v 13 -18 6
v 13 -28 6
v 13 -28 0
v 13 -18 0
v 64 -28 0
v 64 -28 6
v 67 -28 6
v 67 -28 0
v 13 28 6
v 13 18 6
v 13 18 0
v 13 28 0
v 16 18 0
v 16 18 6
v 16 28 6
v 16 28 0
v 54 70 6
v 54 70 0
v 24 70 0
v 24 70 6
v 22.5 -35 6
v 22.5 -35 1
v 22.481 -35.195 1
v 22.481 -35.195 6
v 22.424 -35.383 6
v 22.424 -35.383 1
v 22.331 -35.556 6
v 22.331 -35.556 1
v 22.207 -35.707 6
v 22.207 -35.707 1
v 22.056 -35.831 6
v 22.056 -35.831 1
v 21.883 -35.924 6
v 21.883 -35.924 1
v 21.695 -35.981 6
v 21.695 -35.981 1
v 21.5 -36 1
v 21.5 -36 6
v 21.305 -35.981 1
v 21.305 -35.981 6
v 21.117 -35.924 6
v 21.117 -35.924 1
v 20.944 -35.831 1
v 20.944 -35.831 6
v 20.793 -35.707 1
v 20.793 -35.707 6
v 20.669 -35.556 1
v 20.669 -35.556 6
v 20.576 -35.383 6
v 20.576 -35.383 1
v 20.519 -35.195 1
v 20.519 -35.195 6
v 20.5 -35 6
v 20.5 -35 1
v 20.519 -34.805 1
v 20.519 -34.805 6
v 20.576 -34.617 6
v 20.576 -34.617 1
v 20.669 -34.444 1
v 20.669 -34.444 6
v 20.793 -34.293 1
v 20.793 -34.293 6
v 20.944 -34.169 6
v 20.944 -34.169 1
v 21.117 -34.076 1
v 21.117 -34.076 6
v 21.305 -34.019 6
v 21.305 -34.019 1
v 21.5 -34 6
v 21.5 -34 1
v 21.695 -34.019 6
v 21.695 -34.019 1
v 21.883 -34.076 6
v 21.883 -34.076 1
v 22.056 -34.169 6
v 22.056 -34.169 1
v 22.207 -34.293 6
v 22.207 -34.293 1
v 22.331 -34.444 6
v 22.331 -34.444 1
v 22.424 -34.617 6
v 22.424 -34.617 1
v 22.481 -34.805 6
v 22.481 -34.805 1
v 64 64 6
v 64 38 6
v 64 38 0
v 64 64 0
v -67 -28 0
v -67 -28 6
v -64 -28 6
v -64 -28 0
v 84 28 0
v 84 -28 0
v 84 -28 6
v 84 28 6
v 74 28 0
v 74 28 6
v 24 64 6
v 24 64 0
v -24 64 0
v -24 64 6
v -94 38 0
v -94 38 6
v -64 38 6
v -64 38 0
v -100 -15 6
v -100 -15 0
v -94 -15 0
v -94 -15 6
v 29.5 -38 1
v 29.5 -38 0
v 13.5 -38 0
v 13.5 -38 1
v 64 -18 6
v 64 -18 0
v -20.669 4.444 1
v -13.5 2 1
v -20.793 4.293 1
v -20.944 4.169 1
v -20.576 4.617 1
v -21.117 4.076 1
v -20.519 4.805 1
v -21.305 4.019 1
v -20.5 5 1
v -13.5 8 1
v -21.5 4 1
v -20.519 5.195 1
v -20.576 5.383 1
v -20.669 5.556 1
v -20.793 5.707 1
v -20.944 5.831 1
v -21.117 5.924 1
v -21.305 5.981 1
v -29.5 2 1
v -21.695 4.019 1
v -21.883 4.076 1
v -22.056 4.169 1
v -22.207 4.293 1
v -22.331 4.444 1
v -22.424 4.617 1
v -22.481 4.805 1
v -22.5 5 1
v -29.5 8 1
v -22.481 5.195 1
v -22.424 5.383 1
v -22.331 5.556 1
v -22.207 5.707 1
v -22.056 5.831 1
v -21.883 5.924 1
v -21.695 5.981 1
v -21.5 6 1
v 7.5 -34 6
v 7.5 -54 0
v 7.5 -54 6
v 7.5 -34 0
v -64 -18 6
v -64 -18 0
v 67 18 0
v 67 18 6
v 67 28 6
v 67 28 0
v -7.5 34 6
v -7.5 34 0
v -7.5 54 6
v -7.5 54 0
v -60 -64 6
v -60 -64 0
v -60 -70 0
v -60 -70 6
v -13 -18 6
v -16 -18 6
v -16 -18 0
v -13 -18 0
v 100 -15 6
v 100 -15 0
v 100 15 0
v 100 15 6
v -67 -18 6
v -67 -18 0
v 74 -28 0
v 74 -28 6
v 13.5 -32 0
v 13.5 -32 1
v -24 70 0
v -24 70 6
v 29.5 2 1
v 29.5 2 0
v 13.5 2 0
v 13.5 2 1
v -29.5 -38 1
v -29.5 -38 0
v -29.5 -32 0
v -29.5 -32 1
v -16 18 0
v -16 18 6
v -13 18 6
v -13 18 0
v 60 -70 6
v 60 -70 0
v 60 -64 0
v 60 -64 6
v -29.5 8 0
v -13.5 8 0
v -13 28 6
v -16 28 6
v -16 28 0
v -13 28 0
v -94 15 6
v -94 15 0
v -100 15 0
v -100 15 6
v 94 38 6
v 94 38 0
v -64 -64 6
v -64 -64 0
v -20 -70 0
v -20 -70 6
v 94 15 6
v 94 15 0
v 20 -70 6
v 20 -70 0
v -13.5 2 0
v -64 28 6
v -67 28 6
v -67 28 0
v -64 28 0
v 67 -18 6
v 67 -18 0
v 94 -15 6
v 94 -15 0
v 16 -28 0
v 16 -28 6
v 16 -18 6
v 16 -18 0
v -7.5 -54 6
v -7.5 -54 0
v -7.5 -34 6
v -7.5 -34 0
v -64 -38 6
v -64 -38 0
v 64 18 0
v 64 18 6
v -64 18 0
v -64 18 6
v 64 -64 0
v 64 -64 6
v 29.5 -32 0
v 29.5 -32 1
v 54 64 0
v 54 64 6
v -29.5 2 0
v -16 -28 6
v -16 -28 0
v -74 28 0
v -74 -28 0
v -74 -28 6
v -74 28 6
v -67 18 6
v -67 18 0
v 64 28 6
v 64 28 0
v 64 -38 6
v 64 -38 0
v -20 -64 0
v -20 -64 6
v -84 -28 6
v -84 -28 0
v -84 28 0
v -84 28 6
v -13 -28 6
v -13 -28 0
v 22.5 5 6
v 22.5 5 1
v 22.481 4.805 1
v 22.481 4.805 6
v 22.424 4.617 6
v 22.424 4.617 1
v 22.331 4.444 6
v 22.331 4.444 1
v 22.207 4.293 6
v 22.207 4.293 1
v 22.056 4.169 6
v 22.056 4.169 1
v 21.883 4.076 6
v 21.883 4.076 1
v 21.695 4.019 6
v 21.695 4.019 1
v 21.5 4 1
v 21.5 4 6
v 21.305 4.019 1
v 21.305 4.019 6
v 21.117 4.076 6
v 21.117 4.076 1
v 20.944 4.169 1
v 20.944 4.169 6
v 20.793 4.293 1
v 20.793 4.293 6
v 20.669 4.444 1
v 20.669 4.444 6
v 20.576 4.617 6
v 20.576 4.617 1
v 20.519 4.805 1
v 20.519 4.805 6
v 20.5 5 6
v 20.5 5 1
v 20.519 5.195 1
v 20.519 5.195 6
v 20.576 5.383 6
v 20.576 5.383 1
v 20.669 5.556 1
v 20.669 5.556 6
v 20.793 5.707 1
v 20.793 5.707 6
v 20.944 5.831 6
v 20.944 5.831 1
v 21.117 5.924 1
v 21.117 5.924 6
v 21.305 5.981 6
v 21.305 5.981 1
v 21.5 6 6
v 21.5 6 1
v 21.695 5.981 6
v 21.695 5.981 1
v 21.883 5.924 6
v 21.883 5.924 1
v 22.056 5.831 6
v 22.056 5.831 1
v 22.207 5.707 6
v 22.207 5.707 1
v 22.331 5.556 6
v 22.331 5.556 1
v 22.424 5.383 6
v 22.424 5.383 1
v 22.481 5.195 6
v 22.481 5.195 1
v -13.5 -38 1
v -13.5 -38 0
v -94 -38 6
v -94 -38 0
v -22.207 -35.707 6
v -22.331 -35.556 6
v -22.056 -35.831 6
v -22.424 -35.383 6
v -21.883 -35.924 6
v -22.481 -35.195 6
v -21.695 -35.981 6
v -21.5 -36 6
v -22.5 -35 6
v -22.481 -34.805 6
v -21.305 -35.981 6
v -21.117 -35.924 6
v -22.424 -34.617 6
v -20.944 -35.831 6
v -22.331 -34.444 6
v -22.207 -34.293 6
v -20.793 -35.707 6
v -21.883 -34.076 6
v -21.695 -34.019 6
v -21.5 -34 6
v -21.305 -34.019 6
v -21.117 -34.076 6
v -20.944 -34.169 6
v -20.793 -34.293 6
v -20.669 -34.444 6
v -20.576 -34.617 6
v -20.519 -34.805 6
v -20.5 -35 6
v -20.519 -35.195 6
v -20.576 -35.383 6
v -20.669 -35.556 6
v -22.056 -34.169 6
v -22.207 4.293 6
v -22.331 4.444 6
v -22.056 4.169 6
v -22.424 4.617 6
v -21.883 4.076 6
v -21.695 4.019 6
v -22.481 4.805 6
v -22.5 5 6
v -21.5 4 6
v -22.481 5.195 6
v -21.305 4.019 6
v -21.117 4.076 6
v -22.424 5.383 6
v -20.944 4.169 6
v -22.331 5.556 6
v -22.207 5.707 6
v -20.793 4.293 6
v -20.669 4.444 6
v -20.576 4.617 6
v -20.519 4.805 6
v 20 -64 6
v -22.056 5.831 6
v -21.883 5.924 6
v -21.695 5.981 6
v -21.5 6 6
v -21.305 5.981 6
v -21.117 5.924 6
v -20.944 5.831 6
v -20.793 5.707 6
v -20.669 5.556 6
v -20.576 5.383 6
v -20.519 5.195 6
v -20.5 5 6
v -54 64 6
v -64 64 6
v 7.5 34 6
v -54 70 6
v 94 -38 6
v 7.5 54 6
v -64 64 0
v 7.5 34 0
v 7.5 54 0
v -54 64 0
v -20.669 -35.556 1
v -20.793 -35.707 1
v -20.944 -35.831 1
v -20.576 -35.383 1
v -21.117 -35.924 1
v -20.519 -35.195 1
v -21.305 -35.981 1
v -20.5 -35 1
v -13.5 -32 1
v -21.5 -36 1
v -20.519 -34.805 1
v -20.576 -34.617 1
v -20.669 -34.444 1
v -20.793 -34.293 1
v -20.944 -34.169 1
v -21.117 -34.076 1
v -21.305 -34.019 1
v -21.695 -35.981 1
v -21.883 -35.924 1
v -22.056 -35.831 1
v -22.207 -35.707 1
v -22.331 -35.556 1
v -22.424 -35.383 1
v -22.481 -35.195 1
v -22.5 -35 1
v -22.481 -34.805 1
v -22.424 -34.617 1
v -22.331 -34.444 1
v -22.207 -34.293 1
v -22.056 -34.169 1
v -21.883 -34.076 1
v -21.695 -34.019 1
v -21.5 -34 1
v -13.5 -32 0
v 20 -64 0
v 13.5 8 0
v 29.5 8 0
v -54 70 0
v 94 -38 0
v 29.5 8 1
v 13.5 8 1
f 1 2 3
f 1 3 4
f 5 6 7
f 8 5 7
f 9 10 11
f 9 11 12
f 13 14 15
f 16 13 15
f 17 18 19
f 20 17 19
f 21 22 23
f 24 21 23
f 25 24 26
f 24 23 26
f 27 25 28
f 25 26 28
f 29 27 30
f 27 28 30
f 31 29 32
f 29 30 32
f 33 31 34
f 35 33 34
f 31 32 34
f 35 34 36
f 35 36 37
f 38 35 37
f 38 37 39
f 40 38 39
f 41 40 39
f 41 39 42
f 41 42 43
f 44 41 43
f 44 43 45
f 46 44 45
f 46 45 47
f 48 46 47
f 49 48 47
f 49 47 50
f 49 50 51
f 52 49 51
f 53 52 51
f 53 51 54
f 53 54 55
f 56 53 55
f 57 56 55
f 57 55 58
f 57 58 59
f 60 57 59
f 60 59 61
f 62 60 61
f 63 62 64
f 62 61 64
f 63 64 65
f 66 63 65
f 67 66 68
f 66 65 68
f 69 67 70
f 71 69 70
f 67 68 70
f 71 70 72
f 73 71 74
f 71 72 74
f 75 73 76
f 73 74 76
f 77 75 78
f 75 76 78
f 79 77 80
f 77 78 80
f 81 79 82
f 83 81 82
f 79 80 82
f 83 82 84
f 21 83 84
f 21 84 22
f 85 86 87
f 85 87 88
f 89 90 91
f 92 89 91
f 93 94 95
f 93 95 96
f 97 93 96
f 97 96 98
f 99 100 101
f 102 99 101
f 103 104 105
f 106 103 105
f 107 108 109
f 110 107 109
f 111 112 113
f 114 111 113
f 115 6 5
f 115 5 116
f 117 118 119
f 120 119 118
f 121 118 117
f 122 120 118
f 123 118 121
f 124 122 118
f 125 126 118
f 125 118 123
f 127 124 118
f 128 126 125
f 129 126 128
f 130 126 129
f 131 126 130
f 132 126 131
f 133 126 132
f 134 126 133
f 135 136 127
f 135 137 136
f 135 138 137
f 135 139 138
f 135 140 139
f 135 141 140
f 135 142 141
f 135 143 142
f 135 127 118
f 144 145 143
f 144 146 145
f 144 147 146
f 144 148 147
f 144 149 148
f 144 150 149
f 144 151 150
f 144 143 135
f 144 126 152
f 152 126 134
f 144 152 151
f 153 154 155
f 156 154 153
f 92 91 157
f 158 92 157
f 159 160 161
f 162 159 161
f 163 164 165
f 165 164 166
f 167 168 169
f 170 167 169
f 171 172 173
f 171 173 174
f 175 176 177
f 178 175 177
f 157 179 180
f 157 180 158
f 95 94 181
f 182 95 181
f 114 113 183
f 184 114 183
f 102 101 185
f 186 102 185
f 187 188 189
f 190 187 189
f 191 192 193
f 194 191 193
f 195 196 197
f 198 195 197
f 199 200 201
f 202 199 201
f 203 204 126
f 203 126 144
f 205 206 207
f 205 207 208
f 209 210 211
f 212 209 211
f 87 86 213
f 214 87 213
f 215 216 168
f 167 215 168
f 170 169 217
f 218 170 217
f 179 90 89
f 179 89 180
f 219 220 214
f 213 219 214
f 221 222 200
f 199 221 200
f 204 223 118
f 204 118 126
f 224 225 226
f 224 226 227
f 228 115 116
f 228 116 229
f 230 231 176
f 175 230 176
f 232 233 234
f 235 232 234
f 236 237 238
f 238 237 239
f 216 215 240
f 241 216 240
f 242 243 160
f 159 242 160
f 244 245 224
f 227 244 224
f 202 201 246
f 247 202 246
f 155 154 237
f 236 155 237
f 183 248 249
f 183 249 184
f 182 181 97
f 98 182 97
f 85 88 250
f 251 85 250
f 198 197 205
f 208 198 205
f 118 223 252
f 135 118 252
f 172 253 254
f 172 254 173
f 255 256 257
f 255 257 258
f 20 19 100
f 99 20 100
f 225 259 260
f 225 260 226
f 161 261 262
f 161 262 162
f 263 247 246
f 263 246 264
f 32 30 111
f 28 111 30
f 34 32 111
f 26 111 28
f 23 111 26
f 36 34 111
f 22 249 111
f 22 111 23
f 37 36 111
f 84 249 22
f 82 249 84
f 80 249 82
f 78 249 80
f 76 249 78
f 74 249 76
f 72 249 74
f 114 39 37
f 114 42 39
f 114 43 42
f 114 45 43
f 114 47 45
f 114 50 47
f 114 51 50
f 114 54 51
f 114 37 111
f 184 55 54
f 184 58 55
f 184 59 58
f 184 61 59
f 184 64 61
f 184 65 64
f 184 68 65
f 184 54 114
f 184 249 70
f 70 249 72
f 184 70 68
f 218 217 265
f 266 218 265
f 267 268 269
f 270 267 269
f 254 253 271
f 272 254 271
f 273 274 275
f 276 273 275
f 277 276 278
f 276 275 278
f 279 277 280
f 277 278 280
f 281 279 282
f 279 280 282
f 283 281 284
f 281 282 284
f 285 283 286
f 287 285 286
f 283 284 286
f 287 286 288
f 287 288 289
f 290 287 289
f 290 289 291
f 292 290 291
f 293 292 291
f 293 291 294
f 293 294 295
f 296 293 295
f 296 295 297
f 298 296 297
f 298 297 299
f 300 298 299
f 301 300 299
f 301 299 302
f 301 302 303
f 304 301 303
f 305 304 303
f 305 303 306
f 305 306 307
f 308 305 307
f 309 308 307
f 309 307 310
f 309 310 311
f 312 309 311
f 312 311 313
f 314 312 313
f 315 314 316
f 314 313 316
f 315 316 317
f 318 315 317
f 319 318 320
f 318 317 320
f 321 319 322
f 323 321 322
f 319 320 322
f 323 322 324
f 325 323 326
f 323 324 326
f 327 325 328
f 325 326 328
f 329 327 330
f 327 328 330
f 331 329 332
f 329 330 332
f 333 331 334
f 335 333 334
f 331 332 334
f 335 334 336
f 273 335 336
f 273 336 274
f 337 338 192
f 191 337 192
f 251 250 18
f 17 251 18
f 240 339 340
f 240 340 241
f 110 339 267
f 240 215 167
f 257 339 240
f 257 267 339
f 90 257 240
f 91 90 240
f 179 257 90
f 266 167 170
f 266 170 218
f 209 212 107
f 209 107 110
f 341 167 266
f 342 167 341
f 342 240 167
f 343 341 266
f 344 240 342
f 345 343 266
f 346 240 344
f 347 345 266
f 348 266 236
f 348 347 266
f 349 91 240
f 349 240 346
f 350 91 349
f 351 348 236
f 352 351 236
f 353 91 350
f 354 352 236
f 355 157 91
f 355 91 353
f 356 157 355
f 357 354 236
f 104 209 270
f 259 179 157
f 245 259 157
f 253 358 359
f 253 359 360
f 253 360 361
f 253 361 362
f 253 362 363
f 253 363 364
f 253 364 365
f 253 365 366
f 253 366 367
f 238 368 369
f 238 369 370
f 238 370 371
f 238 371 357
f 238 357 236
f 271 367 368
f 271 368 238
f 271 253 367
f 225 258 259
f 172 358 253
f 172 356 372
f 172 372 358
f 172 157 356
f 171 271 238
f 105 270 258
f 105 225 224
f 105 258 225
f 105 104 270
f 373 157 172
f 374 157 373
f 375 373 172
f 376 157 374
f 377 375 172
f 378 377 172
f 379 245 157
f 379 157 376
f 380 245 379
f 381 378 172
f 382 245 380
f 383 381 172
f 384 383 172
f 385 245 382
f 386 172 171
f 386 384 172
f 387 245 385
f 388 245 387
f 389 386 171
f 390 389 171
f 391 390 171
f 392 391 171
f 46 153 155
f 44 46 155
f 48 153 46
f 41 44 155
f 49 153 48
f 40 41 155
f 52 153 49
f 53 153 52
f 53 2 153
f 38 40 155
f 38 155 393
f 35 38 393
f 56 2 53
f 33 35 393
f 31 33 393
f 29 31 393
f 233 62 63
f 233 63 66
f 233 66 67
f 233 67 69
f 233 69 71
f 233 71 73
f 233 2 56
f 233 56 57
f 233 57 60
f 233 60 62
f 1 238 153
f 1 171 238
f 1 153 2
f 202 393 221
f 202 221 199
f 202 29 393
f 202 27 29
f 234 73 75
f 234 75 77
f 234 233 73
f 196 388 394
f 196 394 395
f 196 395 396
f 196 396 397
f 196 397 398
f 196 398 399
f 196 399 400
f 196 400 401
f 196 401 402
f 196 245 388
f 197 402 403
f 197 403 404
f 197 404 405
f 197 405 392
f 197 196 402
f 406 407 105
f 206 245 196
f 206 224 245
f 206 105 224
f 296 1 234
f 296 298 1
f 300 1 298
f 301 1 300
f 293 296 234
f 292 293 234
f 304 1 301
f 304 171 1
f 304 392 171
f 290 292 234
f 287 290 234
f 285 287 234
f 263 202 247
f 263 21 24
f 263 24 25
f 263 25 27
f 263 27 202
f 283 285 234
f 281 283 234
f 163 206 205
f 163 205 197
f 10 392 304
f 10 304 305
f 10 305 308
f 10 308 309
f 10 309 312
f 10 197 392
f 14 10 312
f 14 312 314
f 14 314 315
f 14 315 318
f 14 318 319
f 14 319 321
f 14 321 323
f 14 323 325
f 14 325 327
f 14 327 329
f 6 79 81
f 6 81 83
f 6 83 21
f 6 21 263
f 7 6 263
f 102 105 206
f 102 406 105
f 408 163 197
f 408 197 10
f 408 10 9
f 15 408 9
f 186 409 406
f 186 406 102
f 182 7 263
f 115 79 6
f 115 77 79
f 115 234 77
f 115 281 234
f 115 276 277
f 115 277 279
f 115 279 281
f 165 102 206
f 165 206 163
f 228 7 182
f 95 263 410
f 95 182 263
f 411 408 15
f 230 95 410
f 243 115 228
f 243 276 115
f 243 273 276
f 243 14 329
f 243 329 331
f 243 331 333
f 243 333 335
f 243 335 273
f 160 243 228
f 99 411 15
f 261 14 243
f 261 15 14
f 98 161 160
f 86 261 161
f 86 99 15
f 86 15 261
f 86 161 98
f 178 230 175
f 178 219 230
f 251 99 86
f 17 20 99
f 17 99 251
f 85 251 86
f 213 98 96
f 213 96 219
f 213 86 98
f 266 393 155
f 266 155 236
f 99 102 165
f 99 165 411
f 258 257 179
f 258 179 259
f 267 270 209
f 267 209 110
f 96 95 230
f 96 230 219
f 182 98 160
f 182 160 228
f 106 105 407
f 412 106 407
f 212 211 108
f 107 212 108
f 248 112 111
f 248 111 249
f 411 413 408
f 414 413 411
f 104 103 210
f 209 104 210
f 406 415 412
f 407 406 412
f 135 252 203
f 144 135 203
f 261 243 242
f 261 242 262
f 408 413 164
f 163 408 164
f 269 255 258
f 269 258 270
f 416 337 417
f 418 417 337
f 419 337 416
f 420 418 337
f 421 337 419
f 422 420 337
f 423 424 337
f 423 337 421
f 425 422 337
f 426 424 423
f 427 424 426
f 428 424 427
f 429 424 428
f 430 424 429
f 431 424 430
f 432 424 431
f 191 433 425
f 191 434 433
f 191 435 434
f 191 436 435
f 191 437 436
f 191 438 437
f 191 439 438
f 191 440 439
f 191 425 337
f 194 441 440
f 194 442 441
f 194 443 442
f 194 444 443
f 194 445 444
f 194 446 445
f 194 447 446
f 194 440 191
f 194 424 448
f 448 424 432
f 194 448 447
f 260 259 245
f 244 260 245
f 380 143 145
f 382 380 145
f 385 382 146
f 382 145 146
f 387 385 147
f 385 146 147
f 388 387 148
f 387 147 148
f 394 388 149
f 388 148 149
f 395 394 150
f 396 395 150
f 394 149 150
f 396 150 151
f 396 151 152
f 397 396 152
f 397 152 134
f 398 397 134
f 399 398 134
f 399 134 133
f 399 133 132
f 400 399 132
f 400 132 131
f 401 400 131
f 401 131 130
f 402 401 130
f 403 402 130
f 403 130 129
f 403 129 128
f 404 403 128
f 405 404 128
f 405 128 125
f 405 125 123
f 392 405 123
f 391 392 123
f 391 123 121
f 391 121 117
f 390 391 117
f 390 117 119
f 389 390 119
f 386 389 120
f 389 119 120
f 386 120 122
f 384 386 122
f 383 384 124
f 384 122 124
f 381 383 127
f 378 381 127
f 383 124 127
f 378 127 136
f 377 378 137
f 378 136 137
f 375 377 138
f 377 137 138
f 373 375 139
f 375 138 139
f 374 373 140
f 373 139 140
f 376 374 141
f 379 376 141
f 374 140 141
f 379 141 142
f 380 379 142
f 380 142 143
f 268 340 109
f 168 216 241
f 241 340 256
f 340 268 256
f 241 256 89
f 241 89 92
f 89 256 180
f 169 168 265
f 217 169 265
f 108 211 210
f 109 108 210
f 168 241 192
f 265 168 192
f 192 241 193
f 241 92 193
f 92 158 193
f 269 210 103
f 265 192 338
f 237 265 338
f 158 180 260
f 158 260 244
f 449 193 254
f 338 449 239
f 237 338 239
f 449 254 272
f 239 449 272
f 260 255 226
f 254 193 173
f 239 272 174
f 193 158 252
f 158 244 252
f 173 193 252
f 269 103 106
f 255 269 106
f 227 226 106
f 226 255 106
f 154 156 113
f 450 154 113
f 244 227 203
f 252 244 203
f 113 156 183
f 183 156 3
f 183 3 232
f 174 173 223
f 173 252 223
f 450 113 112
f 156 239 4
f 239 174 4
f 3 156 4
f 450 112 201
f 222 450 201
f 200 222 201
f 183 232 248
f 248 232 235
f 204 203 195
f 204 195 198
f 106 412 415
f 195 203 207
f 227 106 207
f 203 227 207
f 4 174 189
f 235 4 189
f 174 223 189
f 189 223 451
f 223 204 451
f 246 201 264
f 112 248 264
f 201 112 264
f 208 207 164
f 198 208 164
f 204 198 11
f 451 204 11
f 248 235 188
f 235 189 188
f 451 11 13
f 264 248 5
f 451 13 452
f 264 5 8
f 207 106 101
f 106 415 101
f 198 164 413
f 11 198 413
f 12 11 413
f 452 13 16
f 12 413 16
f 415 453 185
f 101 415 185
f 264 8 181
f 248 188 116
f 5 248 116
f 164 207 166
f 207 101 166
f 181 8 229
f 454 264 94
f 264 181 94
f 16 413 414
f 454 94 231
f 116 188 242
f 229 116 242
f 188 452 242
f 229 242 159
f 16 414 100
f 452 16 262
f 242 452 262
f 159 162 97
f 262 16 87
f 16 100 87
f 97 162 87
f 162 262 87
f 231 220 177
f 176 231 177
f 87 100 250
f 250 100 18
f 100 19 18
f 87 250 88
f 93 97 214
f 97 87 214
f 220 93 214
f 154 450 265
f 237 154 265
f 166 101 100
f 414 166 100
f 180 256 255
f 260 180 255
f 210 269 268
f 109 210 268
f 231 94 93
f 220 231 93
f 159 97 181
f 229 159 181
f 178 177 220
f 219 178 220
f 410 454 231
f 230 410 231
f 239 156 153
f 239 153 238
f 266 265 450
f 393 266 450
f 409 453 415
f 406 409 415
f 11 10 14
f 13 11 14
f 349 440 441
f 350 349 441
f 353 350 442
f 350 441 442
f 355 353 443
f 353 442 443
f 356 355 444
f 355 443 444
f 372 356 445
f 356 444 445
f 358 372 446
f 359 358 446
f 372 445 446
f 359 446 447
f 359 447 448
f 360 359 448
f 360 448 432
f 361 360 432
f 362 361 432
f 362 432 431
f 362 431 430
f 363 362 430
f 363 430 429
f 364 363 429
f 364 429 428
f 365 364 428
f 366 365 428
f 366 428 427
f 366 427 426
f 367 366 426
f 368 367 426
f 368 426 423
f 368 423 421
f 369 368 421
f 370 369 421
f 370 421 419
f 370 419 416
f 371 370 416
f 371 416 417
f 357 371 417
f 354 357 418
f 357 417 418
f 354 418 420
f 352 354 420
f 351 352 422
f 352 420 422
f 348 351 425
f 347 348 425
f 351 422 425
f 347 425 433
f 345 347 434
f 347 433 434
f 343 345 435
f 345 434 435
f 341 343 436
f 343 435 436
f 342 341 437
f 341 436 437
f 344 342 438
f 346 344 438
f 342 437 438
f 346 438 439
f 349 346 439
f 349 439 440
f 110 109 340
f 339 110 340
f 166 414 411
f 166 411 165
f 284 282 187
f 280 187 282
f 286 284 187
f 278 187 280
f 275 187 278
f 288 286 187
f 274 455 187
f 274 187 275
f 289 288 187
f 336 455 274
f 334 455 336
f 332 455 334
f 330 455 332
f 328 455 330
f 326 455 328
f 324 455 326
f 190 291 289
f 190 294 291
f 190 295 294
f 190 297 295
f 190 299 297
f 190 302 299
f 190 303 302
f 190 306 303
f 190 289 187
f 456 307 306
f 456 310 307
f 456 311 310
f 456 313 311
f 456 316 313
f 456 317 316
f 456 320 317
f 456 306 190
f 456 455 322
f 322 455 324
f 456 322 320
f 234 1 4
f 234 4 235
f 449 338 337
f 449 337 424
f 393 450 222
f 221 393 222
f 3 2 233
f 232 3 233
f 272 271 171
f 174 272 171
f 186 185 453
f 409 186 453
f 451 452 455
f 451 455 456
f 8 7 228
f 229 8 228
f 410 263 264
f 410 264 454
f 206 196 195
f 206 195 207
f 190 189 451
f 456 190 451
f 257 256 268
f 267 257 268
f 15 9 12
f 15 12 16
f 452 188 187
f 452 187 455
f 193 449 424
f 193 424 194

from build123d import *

# Parameters (mm, degrees)
BOSS_EXTRU_3_DEPTH      = 6
ESQUISSE2_W             = 3
ESQUISSE2_H             = 10
ENL_V_MAT_EXTRU_1_DEPTH = 10
ESQUISSE3_W             = 30
ESQUISSE3_H             = 26
ENL_V_MAT_EXTRU_2_DEPTH = 6
ESQUISSE4_W             = 15
ESQUISSE4_H             = 20
ENL_V_MAT_EXTRU_3_DEPTH = 6
ESQUISSE5_W             = 10
ESQUISSE5_H             = 56
ENL_V_MAT_EXTRU_4_DEPTH = 6
ESQUISSE6_R             = 1
ENL_V_MAT_EXTRU_5_DEPTH = 123.21292894
ESQUISSE7_W             = 16
ESQUISSE7_H             = 6
ENL_V_MAT_EXTRU_6_DEPTH = 1


with BuildPart() as part:
    # Esquisse1 → Boss.-Extru.3 (new body)
    with BuildSketch(Plane.XY):
        Polygon((-94, 64), (-94, 15), (-100, 15), (-100, -15), (-94, -15), (-94, -64), (-60, -64), (-60, -70), (-20, -70), (-20, -64), (20, -64), (20, -70), (60, -70), (60, -64), (94, -64), (94, -15), (100, -15), (100, 15), (94, 15), (94, 64), (54, 64), (54, 70), (24, 70), (24, 64), (-24, 64), (-24, 70), (-54, 70), (-54, 64), align=None)
    extrude(amount=BOSS_EXTRU_3_DEPTH)

    # Esquisse2 → Enlèv. mat.-Extru.1 (cut)
    with BuildSketch(Plane.XY.offset(6)):
        with Locations((-65.5, -23)):
            Rectangle(ESQUISSE2_W, ESQUISSE2_H)
        with Locations((-65.5, 23)):
            Rectangle(ESQUISSE2_W, ESQUISSE2_H)
        with Locations((-14.5, -23)):
            Rectangle(ESQUISSE2_W, ESQUISSE2_H)
        with Locations((-14.5, 23)):
            Rectangle(ESQUISSE2_W, ESQUISSE2_H)
        with Locations((65.5, -23)):
            Rectangle(ESQUISSE2_W, ESQUISSE2_H)
        with Locations((14.5, 23)):
            Rectangle(ESQUISSE2_W, ESQUISSE2_H)
        with Locations((14.5, -23)):
            Rectangle(ESQUISSE2_W, ESQUISSE2_H)
        with Locations((65.5, 23)):
            Rectangle(ESQUISSE2_W, ESQUISSE2_H)
    extrude(amount=-ENL_V_MAT_EXTRU_1_DEPTH, mode=Mode.SUBTRACT)

    # Esquisse3 → Enlèv. mat.-Extru.2 (cut)
    with BuildSketch(Plane.XY.offset(6)):
        with Locations((79, -51)):
            Rectangle(ESQUISSE3_W, ESQUISSE3_H)
        with Locations((-79, -51)):
            Rectangle(ESQUISSE3_W, ESQUISSE3_H)
        with Locations((-79, 51)):
            Rectangle(ESQUISSE3_W, ESQUISSE3_H)
        with Locations((79, 51)):
            Rectangle(ESQUISSE3_W, ESQUISSE3_H)
    extrude(amount=-ENL_V_MAT_EXTRU_2_DEPTH, mode=Mode.SUBTRACT)

    # Esquisse4 → Enlèv. mat.-Extru.3 (cut)
    with BuildSketch(Plane(origin=(0, 0, 0), x_dir=(-1, 0, 0), z_dir=(0, 0, -1))):
        with Locations((0, -44)):
            Rectangle(ESQUISSE4_W, ESQUISSE4_H)
        with Locations((0, 44)):
            Rectangle(ESQUISSE4_W, ESQUISSE4_H)
    extrude(amount=-ENL_V_MAT_EXTRU_3_DEPTH, mode=Mode.SUBTRACT)

    # Esquisse5 → Enlèv. mat.-Extru.4 (cut)
    with BuildSketch(Plane(origin=(0, 0, 0), x_dir=(-1, 0, 0), z_dir=(0, 0, -1))):
        with Locations((-79, 0)):
            Rectangle(ESQUISSE5_W, ESQUISSE5_H)
        with Locations((79, 0)):
            Rectangle(ESQUISSE5_W, ESQUISSE5_H)
    extrude(amount=-ENL_V_MAT_EXTRU_4_DEPTH, mode=Mode.SUBTRACT)

    # Esquisse6 → Enlèv. mat.-Extru.5 (cut, through all)
    with BuildSketch(Plane(origin=(0, 0, 0), x_dir=(-1, 0, 0), z_dir=(0, 0, -1))):
        with Locations((21.5, -35)):
            Circle(ESQUISSE6_R)
        with Locations((21.5, 5)):
            Circle(ESQUISSE6_R)
        with Locations(Location((-21.5, 5, 0), (0, 0, 180))):
            Circle(ESQUISSE6_R)
        with Locations(Location((-21.5, -35, 0), (0, 0, 180))):
            Circle(ESQUISSE6_R)
    extrude(amount=-ENL_V_MAT_EXTRU_5_DEPTH, mode=Mode.SUBTRACT)

    # Esquisse7 → Enlèv. mat.-Extru.6 (cut)
    with BuildSketch(Plane(origin=(0, 0, 0), x_dir=(-1, 0, 0), z_dir=(0, 0, -1))):
        with Locations((21.5, -35)):
            Rectangle(ESQUISSE7_W, ESQUISSE7_H)
        with Locations((21.5, 5)):
            Rectangle(ESQUISSE7_W, ESQUISSE7_H)
        with Locations((-21.5, 5)):
            Rectangle(ESQUISSE7_W, ESQUISSE7_H)
        with Locations((-21.5, -35)):
            Rectangle(ESQUISSE7_W, ESQUISSE7_H)
    extrude(amount=-ENL_V_MAT_EXTRU_6_DEPTH, mode=Mode.SUBTRACT)


solid = part.part
